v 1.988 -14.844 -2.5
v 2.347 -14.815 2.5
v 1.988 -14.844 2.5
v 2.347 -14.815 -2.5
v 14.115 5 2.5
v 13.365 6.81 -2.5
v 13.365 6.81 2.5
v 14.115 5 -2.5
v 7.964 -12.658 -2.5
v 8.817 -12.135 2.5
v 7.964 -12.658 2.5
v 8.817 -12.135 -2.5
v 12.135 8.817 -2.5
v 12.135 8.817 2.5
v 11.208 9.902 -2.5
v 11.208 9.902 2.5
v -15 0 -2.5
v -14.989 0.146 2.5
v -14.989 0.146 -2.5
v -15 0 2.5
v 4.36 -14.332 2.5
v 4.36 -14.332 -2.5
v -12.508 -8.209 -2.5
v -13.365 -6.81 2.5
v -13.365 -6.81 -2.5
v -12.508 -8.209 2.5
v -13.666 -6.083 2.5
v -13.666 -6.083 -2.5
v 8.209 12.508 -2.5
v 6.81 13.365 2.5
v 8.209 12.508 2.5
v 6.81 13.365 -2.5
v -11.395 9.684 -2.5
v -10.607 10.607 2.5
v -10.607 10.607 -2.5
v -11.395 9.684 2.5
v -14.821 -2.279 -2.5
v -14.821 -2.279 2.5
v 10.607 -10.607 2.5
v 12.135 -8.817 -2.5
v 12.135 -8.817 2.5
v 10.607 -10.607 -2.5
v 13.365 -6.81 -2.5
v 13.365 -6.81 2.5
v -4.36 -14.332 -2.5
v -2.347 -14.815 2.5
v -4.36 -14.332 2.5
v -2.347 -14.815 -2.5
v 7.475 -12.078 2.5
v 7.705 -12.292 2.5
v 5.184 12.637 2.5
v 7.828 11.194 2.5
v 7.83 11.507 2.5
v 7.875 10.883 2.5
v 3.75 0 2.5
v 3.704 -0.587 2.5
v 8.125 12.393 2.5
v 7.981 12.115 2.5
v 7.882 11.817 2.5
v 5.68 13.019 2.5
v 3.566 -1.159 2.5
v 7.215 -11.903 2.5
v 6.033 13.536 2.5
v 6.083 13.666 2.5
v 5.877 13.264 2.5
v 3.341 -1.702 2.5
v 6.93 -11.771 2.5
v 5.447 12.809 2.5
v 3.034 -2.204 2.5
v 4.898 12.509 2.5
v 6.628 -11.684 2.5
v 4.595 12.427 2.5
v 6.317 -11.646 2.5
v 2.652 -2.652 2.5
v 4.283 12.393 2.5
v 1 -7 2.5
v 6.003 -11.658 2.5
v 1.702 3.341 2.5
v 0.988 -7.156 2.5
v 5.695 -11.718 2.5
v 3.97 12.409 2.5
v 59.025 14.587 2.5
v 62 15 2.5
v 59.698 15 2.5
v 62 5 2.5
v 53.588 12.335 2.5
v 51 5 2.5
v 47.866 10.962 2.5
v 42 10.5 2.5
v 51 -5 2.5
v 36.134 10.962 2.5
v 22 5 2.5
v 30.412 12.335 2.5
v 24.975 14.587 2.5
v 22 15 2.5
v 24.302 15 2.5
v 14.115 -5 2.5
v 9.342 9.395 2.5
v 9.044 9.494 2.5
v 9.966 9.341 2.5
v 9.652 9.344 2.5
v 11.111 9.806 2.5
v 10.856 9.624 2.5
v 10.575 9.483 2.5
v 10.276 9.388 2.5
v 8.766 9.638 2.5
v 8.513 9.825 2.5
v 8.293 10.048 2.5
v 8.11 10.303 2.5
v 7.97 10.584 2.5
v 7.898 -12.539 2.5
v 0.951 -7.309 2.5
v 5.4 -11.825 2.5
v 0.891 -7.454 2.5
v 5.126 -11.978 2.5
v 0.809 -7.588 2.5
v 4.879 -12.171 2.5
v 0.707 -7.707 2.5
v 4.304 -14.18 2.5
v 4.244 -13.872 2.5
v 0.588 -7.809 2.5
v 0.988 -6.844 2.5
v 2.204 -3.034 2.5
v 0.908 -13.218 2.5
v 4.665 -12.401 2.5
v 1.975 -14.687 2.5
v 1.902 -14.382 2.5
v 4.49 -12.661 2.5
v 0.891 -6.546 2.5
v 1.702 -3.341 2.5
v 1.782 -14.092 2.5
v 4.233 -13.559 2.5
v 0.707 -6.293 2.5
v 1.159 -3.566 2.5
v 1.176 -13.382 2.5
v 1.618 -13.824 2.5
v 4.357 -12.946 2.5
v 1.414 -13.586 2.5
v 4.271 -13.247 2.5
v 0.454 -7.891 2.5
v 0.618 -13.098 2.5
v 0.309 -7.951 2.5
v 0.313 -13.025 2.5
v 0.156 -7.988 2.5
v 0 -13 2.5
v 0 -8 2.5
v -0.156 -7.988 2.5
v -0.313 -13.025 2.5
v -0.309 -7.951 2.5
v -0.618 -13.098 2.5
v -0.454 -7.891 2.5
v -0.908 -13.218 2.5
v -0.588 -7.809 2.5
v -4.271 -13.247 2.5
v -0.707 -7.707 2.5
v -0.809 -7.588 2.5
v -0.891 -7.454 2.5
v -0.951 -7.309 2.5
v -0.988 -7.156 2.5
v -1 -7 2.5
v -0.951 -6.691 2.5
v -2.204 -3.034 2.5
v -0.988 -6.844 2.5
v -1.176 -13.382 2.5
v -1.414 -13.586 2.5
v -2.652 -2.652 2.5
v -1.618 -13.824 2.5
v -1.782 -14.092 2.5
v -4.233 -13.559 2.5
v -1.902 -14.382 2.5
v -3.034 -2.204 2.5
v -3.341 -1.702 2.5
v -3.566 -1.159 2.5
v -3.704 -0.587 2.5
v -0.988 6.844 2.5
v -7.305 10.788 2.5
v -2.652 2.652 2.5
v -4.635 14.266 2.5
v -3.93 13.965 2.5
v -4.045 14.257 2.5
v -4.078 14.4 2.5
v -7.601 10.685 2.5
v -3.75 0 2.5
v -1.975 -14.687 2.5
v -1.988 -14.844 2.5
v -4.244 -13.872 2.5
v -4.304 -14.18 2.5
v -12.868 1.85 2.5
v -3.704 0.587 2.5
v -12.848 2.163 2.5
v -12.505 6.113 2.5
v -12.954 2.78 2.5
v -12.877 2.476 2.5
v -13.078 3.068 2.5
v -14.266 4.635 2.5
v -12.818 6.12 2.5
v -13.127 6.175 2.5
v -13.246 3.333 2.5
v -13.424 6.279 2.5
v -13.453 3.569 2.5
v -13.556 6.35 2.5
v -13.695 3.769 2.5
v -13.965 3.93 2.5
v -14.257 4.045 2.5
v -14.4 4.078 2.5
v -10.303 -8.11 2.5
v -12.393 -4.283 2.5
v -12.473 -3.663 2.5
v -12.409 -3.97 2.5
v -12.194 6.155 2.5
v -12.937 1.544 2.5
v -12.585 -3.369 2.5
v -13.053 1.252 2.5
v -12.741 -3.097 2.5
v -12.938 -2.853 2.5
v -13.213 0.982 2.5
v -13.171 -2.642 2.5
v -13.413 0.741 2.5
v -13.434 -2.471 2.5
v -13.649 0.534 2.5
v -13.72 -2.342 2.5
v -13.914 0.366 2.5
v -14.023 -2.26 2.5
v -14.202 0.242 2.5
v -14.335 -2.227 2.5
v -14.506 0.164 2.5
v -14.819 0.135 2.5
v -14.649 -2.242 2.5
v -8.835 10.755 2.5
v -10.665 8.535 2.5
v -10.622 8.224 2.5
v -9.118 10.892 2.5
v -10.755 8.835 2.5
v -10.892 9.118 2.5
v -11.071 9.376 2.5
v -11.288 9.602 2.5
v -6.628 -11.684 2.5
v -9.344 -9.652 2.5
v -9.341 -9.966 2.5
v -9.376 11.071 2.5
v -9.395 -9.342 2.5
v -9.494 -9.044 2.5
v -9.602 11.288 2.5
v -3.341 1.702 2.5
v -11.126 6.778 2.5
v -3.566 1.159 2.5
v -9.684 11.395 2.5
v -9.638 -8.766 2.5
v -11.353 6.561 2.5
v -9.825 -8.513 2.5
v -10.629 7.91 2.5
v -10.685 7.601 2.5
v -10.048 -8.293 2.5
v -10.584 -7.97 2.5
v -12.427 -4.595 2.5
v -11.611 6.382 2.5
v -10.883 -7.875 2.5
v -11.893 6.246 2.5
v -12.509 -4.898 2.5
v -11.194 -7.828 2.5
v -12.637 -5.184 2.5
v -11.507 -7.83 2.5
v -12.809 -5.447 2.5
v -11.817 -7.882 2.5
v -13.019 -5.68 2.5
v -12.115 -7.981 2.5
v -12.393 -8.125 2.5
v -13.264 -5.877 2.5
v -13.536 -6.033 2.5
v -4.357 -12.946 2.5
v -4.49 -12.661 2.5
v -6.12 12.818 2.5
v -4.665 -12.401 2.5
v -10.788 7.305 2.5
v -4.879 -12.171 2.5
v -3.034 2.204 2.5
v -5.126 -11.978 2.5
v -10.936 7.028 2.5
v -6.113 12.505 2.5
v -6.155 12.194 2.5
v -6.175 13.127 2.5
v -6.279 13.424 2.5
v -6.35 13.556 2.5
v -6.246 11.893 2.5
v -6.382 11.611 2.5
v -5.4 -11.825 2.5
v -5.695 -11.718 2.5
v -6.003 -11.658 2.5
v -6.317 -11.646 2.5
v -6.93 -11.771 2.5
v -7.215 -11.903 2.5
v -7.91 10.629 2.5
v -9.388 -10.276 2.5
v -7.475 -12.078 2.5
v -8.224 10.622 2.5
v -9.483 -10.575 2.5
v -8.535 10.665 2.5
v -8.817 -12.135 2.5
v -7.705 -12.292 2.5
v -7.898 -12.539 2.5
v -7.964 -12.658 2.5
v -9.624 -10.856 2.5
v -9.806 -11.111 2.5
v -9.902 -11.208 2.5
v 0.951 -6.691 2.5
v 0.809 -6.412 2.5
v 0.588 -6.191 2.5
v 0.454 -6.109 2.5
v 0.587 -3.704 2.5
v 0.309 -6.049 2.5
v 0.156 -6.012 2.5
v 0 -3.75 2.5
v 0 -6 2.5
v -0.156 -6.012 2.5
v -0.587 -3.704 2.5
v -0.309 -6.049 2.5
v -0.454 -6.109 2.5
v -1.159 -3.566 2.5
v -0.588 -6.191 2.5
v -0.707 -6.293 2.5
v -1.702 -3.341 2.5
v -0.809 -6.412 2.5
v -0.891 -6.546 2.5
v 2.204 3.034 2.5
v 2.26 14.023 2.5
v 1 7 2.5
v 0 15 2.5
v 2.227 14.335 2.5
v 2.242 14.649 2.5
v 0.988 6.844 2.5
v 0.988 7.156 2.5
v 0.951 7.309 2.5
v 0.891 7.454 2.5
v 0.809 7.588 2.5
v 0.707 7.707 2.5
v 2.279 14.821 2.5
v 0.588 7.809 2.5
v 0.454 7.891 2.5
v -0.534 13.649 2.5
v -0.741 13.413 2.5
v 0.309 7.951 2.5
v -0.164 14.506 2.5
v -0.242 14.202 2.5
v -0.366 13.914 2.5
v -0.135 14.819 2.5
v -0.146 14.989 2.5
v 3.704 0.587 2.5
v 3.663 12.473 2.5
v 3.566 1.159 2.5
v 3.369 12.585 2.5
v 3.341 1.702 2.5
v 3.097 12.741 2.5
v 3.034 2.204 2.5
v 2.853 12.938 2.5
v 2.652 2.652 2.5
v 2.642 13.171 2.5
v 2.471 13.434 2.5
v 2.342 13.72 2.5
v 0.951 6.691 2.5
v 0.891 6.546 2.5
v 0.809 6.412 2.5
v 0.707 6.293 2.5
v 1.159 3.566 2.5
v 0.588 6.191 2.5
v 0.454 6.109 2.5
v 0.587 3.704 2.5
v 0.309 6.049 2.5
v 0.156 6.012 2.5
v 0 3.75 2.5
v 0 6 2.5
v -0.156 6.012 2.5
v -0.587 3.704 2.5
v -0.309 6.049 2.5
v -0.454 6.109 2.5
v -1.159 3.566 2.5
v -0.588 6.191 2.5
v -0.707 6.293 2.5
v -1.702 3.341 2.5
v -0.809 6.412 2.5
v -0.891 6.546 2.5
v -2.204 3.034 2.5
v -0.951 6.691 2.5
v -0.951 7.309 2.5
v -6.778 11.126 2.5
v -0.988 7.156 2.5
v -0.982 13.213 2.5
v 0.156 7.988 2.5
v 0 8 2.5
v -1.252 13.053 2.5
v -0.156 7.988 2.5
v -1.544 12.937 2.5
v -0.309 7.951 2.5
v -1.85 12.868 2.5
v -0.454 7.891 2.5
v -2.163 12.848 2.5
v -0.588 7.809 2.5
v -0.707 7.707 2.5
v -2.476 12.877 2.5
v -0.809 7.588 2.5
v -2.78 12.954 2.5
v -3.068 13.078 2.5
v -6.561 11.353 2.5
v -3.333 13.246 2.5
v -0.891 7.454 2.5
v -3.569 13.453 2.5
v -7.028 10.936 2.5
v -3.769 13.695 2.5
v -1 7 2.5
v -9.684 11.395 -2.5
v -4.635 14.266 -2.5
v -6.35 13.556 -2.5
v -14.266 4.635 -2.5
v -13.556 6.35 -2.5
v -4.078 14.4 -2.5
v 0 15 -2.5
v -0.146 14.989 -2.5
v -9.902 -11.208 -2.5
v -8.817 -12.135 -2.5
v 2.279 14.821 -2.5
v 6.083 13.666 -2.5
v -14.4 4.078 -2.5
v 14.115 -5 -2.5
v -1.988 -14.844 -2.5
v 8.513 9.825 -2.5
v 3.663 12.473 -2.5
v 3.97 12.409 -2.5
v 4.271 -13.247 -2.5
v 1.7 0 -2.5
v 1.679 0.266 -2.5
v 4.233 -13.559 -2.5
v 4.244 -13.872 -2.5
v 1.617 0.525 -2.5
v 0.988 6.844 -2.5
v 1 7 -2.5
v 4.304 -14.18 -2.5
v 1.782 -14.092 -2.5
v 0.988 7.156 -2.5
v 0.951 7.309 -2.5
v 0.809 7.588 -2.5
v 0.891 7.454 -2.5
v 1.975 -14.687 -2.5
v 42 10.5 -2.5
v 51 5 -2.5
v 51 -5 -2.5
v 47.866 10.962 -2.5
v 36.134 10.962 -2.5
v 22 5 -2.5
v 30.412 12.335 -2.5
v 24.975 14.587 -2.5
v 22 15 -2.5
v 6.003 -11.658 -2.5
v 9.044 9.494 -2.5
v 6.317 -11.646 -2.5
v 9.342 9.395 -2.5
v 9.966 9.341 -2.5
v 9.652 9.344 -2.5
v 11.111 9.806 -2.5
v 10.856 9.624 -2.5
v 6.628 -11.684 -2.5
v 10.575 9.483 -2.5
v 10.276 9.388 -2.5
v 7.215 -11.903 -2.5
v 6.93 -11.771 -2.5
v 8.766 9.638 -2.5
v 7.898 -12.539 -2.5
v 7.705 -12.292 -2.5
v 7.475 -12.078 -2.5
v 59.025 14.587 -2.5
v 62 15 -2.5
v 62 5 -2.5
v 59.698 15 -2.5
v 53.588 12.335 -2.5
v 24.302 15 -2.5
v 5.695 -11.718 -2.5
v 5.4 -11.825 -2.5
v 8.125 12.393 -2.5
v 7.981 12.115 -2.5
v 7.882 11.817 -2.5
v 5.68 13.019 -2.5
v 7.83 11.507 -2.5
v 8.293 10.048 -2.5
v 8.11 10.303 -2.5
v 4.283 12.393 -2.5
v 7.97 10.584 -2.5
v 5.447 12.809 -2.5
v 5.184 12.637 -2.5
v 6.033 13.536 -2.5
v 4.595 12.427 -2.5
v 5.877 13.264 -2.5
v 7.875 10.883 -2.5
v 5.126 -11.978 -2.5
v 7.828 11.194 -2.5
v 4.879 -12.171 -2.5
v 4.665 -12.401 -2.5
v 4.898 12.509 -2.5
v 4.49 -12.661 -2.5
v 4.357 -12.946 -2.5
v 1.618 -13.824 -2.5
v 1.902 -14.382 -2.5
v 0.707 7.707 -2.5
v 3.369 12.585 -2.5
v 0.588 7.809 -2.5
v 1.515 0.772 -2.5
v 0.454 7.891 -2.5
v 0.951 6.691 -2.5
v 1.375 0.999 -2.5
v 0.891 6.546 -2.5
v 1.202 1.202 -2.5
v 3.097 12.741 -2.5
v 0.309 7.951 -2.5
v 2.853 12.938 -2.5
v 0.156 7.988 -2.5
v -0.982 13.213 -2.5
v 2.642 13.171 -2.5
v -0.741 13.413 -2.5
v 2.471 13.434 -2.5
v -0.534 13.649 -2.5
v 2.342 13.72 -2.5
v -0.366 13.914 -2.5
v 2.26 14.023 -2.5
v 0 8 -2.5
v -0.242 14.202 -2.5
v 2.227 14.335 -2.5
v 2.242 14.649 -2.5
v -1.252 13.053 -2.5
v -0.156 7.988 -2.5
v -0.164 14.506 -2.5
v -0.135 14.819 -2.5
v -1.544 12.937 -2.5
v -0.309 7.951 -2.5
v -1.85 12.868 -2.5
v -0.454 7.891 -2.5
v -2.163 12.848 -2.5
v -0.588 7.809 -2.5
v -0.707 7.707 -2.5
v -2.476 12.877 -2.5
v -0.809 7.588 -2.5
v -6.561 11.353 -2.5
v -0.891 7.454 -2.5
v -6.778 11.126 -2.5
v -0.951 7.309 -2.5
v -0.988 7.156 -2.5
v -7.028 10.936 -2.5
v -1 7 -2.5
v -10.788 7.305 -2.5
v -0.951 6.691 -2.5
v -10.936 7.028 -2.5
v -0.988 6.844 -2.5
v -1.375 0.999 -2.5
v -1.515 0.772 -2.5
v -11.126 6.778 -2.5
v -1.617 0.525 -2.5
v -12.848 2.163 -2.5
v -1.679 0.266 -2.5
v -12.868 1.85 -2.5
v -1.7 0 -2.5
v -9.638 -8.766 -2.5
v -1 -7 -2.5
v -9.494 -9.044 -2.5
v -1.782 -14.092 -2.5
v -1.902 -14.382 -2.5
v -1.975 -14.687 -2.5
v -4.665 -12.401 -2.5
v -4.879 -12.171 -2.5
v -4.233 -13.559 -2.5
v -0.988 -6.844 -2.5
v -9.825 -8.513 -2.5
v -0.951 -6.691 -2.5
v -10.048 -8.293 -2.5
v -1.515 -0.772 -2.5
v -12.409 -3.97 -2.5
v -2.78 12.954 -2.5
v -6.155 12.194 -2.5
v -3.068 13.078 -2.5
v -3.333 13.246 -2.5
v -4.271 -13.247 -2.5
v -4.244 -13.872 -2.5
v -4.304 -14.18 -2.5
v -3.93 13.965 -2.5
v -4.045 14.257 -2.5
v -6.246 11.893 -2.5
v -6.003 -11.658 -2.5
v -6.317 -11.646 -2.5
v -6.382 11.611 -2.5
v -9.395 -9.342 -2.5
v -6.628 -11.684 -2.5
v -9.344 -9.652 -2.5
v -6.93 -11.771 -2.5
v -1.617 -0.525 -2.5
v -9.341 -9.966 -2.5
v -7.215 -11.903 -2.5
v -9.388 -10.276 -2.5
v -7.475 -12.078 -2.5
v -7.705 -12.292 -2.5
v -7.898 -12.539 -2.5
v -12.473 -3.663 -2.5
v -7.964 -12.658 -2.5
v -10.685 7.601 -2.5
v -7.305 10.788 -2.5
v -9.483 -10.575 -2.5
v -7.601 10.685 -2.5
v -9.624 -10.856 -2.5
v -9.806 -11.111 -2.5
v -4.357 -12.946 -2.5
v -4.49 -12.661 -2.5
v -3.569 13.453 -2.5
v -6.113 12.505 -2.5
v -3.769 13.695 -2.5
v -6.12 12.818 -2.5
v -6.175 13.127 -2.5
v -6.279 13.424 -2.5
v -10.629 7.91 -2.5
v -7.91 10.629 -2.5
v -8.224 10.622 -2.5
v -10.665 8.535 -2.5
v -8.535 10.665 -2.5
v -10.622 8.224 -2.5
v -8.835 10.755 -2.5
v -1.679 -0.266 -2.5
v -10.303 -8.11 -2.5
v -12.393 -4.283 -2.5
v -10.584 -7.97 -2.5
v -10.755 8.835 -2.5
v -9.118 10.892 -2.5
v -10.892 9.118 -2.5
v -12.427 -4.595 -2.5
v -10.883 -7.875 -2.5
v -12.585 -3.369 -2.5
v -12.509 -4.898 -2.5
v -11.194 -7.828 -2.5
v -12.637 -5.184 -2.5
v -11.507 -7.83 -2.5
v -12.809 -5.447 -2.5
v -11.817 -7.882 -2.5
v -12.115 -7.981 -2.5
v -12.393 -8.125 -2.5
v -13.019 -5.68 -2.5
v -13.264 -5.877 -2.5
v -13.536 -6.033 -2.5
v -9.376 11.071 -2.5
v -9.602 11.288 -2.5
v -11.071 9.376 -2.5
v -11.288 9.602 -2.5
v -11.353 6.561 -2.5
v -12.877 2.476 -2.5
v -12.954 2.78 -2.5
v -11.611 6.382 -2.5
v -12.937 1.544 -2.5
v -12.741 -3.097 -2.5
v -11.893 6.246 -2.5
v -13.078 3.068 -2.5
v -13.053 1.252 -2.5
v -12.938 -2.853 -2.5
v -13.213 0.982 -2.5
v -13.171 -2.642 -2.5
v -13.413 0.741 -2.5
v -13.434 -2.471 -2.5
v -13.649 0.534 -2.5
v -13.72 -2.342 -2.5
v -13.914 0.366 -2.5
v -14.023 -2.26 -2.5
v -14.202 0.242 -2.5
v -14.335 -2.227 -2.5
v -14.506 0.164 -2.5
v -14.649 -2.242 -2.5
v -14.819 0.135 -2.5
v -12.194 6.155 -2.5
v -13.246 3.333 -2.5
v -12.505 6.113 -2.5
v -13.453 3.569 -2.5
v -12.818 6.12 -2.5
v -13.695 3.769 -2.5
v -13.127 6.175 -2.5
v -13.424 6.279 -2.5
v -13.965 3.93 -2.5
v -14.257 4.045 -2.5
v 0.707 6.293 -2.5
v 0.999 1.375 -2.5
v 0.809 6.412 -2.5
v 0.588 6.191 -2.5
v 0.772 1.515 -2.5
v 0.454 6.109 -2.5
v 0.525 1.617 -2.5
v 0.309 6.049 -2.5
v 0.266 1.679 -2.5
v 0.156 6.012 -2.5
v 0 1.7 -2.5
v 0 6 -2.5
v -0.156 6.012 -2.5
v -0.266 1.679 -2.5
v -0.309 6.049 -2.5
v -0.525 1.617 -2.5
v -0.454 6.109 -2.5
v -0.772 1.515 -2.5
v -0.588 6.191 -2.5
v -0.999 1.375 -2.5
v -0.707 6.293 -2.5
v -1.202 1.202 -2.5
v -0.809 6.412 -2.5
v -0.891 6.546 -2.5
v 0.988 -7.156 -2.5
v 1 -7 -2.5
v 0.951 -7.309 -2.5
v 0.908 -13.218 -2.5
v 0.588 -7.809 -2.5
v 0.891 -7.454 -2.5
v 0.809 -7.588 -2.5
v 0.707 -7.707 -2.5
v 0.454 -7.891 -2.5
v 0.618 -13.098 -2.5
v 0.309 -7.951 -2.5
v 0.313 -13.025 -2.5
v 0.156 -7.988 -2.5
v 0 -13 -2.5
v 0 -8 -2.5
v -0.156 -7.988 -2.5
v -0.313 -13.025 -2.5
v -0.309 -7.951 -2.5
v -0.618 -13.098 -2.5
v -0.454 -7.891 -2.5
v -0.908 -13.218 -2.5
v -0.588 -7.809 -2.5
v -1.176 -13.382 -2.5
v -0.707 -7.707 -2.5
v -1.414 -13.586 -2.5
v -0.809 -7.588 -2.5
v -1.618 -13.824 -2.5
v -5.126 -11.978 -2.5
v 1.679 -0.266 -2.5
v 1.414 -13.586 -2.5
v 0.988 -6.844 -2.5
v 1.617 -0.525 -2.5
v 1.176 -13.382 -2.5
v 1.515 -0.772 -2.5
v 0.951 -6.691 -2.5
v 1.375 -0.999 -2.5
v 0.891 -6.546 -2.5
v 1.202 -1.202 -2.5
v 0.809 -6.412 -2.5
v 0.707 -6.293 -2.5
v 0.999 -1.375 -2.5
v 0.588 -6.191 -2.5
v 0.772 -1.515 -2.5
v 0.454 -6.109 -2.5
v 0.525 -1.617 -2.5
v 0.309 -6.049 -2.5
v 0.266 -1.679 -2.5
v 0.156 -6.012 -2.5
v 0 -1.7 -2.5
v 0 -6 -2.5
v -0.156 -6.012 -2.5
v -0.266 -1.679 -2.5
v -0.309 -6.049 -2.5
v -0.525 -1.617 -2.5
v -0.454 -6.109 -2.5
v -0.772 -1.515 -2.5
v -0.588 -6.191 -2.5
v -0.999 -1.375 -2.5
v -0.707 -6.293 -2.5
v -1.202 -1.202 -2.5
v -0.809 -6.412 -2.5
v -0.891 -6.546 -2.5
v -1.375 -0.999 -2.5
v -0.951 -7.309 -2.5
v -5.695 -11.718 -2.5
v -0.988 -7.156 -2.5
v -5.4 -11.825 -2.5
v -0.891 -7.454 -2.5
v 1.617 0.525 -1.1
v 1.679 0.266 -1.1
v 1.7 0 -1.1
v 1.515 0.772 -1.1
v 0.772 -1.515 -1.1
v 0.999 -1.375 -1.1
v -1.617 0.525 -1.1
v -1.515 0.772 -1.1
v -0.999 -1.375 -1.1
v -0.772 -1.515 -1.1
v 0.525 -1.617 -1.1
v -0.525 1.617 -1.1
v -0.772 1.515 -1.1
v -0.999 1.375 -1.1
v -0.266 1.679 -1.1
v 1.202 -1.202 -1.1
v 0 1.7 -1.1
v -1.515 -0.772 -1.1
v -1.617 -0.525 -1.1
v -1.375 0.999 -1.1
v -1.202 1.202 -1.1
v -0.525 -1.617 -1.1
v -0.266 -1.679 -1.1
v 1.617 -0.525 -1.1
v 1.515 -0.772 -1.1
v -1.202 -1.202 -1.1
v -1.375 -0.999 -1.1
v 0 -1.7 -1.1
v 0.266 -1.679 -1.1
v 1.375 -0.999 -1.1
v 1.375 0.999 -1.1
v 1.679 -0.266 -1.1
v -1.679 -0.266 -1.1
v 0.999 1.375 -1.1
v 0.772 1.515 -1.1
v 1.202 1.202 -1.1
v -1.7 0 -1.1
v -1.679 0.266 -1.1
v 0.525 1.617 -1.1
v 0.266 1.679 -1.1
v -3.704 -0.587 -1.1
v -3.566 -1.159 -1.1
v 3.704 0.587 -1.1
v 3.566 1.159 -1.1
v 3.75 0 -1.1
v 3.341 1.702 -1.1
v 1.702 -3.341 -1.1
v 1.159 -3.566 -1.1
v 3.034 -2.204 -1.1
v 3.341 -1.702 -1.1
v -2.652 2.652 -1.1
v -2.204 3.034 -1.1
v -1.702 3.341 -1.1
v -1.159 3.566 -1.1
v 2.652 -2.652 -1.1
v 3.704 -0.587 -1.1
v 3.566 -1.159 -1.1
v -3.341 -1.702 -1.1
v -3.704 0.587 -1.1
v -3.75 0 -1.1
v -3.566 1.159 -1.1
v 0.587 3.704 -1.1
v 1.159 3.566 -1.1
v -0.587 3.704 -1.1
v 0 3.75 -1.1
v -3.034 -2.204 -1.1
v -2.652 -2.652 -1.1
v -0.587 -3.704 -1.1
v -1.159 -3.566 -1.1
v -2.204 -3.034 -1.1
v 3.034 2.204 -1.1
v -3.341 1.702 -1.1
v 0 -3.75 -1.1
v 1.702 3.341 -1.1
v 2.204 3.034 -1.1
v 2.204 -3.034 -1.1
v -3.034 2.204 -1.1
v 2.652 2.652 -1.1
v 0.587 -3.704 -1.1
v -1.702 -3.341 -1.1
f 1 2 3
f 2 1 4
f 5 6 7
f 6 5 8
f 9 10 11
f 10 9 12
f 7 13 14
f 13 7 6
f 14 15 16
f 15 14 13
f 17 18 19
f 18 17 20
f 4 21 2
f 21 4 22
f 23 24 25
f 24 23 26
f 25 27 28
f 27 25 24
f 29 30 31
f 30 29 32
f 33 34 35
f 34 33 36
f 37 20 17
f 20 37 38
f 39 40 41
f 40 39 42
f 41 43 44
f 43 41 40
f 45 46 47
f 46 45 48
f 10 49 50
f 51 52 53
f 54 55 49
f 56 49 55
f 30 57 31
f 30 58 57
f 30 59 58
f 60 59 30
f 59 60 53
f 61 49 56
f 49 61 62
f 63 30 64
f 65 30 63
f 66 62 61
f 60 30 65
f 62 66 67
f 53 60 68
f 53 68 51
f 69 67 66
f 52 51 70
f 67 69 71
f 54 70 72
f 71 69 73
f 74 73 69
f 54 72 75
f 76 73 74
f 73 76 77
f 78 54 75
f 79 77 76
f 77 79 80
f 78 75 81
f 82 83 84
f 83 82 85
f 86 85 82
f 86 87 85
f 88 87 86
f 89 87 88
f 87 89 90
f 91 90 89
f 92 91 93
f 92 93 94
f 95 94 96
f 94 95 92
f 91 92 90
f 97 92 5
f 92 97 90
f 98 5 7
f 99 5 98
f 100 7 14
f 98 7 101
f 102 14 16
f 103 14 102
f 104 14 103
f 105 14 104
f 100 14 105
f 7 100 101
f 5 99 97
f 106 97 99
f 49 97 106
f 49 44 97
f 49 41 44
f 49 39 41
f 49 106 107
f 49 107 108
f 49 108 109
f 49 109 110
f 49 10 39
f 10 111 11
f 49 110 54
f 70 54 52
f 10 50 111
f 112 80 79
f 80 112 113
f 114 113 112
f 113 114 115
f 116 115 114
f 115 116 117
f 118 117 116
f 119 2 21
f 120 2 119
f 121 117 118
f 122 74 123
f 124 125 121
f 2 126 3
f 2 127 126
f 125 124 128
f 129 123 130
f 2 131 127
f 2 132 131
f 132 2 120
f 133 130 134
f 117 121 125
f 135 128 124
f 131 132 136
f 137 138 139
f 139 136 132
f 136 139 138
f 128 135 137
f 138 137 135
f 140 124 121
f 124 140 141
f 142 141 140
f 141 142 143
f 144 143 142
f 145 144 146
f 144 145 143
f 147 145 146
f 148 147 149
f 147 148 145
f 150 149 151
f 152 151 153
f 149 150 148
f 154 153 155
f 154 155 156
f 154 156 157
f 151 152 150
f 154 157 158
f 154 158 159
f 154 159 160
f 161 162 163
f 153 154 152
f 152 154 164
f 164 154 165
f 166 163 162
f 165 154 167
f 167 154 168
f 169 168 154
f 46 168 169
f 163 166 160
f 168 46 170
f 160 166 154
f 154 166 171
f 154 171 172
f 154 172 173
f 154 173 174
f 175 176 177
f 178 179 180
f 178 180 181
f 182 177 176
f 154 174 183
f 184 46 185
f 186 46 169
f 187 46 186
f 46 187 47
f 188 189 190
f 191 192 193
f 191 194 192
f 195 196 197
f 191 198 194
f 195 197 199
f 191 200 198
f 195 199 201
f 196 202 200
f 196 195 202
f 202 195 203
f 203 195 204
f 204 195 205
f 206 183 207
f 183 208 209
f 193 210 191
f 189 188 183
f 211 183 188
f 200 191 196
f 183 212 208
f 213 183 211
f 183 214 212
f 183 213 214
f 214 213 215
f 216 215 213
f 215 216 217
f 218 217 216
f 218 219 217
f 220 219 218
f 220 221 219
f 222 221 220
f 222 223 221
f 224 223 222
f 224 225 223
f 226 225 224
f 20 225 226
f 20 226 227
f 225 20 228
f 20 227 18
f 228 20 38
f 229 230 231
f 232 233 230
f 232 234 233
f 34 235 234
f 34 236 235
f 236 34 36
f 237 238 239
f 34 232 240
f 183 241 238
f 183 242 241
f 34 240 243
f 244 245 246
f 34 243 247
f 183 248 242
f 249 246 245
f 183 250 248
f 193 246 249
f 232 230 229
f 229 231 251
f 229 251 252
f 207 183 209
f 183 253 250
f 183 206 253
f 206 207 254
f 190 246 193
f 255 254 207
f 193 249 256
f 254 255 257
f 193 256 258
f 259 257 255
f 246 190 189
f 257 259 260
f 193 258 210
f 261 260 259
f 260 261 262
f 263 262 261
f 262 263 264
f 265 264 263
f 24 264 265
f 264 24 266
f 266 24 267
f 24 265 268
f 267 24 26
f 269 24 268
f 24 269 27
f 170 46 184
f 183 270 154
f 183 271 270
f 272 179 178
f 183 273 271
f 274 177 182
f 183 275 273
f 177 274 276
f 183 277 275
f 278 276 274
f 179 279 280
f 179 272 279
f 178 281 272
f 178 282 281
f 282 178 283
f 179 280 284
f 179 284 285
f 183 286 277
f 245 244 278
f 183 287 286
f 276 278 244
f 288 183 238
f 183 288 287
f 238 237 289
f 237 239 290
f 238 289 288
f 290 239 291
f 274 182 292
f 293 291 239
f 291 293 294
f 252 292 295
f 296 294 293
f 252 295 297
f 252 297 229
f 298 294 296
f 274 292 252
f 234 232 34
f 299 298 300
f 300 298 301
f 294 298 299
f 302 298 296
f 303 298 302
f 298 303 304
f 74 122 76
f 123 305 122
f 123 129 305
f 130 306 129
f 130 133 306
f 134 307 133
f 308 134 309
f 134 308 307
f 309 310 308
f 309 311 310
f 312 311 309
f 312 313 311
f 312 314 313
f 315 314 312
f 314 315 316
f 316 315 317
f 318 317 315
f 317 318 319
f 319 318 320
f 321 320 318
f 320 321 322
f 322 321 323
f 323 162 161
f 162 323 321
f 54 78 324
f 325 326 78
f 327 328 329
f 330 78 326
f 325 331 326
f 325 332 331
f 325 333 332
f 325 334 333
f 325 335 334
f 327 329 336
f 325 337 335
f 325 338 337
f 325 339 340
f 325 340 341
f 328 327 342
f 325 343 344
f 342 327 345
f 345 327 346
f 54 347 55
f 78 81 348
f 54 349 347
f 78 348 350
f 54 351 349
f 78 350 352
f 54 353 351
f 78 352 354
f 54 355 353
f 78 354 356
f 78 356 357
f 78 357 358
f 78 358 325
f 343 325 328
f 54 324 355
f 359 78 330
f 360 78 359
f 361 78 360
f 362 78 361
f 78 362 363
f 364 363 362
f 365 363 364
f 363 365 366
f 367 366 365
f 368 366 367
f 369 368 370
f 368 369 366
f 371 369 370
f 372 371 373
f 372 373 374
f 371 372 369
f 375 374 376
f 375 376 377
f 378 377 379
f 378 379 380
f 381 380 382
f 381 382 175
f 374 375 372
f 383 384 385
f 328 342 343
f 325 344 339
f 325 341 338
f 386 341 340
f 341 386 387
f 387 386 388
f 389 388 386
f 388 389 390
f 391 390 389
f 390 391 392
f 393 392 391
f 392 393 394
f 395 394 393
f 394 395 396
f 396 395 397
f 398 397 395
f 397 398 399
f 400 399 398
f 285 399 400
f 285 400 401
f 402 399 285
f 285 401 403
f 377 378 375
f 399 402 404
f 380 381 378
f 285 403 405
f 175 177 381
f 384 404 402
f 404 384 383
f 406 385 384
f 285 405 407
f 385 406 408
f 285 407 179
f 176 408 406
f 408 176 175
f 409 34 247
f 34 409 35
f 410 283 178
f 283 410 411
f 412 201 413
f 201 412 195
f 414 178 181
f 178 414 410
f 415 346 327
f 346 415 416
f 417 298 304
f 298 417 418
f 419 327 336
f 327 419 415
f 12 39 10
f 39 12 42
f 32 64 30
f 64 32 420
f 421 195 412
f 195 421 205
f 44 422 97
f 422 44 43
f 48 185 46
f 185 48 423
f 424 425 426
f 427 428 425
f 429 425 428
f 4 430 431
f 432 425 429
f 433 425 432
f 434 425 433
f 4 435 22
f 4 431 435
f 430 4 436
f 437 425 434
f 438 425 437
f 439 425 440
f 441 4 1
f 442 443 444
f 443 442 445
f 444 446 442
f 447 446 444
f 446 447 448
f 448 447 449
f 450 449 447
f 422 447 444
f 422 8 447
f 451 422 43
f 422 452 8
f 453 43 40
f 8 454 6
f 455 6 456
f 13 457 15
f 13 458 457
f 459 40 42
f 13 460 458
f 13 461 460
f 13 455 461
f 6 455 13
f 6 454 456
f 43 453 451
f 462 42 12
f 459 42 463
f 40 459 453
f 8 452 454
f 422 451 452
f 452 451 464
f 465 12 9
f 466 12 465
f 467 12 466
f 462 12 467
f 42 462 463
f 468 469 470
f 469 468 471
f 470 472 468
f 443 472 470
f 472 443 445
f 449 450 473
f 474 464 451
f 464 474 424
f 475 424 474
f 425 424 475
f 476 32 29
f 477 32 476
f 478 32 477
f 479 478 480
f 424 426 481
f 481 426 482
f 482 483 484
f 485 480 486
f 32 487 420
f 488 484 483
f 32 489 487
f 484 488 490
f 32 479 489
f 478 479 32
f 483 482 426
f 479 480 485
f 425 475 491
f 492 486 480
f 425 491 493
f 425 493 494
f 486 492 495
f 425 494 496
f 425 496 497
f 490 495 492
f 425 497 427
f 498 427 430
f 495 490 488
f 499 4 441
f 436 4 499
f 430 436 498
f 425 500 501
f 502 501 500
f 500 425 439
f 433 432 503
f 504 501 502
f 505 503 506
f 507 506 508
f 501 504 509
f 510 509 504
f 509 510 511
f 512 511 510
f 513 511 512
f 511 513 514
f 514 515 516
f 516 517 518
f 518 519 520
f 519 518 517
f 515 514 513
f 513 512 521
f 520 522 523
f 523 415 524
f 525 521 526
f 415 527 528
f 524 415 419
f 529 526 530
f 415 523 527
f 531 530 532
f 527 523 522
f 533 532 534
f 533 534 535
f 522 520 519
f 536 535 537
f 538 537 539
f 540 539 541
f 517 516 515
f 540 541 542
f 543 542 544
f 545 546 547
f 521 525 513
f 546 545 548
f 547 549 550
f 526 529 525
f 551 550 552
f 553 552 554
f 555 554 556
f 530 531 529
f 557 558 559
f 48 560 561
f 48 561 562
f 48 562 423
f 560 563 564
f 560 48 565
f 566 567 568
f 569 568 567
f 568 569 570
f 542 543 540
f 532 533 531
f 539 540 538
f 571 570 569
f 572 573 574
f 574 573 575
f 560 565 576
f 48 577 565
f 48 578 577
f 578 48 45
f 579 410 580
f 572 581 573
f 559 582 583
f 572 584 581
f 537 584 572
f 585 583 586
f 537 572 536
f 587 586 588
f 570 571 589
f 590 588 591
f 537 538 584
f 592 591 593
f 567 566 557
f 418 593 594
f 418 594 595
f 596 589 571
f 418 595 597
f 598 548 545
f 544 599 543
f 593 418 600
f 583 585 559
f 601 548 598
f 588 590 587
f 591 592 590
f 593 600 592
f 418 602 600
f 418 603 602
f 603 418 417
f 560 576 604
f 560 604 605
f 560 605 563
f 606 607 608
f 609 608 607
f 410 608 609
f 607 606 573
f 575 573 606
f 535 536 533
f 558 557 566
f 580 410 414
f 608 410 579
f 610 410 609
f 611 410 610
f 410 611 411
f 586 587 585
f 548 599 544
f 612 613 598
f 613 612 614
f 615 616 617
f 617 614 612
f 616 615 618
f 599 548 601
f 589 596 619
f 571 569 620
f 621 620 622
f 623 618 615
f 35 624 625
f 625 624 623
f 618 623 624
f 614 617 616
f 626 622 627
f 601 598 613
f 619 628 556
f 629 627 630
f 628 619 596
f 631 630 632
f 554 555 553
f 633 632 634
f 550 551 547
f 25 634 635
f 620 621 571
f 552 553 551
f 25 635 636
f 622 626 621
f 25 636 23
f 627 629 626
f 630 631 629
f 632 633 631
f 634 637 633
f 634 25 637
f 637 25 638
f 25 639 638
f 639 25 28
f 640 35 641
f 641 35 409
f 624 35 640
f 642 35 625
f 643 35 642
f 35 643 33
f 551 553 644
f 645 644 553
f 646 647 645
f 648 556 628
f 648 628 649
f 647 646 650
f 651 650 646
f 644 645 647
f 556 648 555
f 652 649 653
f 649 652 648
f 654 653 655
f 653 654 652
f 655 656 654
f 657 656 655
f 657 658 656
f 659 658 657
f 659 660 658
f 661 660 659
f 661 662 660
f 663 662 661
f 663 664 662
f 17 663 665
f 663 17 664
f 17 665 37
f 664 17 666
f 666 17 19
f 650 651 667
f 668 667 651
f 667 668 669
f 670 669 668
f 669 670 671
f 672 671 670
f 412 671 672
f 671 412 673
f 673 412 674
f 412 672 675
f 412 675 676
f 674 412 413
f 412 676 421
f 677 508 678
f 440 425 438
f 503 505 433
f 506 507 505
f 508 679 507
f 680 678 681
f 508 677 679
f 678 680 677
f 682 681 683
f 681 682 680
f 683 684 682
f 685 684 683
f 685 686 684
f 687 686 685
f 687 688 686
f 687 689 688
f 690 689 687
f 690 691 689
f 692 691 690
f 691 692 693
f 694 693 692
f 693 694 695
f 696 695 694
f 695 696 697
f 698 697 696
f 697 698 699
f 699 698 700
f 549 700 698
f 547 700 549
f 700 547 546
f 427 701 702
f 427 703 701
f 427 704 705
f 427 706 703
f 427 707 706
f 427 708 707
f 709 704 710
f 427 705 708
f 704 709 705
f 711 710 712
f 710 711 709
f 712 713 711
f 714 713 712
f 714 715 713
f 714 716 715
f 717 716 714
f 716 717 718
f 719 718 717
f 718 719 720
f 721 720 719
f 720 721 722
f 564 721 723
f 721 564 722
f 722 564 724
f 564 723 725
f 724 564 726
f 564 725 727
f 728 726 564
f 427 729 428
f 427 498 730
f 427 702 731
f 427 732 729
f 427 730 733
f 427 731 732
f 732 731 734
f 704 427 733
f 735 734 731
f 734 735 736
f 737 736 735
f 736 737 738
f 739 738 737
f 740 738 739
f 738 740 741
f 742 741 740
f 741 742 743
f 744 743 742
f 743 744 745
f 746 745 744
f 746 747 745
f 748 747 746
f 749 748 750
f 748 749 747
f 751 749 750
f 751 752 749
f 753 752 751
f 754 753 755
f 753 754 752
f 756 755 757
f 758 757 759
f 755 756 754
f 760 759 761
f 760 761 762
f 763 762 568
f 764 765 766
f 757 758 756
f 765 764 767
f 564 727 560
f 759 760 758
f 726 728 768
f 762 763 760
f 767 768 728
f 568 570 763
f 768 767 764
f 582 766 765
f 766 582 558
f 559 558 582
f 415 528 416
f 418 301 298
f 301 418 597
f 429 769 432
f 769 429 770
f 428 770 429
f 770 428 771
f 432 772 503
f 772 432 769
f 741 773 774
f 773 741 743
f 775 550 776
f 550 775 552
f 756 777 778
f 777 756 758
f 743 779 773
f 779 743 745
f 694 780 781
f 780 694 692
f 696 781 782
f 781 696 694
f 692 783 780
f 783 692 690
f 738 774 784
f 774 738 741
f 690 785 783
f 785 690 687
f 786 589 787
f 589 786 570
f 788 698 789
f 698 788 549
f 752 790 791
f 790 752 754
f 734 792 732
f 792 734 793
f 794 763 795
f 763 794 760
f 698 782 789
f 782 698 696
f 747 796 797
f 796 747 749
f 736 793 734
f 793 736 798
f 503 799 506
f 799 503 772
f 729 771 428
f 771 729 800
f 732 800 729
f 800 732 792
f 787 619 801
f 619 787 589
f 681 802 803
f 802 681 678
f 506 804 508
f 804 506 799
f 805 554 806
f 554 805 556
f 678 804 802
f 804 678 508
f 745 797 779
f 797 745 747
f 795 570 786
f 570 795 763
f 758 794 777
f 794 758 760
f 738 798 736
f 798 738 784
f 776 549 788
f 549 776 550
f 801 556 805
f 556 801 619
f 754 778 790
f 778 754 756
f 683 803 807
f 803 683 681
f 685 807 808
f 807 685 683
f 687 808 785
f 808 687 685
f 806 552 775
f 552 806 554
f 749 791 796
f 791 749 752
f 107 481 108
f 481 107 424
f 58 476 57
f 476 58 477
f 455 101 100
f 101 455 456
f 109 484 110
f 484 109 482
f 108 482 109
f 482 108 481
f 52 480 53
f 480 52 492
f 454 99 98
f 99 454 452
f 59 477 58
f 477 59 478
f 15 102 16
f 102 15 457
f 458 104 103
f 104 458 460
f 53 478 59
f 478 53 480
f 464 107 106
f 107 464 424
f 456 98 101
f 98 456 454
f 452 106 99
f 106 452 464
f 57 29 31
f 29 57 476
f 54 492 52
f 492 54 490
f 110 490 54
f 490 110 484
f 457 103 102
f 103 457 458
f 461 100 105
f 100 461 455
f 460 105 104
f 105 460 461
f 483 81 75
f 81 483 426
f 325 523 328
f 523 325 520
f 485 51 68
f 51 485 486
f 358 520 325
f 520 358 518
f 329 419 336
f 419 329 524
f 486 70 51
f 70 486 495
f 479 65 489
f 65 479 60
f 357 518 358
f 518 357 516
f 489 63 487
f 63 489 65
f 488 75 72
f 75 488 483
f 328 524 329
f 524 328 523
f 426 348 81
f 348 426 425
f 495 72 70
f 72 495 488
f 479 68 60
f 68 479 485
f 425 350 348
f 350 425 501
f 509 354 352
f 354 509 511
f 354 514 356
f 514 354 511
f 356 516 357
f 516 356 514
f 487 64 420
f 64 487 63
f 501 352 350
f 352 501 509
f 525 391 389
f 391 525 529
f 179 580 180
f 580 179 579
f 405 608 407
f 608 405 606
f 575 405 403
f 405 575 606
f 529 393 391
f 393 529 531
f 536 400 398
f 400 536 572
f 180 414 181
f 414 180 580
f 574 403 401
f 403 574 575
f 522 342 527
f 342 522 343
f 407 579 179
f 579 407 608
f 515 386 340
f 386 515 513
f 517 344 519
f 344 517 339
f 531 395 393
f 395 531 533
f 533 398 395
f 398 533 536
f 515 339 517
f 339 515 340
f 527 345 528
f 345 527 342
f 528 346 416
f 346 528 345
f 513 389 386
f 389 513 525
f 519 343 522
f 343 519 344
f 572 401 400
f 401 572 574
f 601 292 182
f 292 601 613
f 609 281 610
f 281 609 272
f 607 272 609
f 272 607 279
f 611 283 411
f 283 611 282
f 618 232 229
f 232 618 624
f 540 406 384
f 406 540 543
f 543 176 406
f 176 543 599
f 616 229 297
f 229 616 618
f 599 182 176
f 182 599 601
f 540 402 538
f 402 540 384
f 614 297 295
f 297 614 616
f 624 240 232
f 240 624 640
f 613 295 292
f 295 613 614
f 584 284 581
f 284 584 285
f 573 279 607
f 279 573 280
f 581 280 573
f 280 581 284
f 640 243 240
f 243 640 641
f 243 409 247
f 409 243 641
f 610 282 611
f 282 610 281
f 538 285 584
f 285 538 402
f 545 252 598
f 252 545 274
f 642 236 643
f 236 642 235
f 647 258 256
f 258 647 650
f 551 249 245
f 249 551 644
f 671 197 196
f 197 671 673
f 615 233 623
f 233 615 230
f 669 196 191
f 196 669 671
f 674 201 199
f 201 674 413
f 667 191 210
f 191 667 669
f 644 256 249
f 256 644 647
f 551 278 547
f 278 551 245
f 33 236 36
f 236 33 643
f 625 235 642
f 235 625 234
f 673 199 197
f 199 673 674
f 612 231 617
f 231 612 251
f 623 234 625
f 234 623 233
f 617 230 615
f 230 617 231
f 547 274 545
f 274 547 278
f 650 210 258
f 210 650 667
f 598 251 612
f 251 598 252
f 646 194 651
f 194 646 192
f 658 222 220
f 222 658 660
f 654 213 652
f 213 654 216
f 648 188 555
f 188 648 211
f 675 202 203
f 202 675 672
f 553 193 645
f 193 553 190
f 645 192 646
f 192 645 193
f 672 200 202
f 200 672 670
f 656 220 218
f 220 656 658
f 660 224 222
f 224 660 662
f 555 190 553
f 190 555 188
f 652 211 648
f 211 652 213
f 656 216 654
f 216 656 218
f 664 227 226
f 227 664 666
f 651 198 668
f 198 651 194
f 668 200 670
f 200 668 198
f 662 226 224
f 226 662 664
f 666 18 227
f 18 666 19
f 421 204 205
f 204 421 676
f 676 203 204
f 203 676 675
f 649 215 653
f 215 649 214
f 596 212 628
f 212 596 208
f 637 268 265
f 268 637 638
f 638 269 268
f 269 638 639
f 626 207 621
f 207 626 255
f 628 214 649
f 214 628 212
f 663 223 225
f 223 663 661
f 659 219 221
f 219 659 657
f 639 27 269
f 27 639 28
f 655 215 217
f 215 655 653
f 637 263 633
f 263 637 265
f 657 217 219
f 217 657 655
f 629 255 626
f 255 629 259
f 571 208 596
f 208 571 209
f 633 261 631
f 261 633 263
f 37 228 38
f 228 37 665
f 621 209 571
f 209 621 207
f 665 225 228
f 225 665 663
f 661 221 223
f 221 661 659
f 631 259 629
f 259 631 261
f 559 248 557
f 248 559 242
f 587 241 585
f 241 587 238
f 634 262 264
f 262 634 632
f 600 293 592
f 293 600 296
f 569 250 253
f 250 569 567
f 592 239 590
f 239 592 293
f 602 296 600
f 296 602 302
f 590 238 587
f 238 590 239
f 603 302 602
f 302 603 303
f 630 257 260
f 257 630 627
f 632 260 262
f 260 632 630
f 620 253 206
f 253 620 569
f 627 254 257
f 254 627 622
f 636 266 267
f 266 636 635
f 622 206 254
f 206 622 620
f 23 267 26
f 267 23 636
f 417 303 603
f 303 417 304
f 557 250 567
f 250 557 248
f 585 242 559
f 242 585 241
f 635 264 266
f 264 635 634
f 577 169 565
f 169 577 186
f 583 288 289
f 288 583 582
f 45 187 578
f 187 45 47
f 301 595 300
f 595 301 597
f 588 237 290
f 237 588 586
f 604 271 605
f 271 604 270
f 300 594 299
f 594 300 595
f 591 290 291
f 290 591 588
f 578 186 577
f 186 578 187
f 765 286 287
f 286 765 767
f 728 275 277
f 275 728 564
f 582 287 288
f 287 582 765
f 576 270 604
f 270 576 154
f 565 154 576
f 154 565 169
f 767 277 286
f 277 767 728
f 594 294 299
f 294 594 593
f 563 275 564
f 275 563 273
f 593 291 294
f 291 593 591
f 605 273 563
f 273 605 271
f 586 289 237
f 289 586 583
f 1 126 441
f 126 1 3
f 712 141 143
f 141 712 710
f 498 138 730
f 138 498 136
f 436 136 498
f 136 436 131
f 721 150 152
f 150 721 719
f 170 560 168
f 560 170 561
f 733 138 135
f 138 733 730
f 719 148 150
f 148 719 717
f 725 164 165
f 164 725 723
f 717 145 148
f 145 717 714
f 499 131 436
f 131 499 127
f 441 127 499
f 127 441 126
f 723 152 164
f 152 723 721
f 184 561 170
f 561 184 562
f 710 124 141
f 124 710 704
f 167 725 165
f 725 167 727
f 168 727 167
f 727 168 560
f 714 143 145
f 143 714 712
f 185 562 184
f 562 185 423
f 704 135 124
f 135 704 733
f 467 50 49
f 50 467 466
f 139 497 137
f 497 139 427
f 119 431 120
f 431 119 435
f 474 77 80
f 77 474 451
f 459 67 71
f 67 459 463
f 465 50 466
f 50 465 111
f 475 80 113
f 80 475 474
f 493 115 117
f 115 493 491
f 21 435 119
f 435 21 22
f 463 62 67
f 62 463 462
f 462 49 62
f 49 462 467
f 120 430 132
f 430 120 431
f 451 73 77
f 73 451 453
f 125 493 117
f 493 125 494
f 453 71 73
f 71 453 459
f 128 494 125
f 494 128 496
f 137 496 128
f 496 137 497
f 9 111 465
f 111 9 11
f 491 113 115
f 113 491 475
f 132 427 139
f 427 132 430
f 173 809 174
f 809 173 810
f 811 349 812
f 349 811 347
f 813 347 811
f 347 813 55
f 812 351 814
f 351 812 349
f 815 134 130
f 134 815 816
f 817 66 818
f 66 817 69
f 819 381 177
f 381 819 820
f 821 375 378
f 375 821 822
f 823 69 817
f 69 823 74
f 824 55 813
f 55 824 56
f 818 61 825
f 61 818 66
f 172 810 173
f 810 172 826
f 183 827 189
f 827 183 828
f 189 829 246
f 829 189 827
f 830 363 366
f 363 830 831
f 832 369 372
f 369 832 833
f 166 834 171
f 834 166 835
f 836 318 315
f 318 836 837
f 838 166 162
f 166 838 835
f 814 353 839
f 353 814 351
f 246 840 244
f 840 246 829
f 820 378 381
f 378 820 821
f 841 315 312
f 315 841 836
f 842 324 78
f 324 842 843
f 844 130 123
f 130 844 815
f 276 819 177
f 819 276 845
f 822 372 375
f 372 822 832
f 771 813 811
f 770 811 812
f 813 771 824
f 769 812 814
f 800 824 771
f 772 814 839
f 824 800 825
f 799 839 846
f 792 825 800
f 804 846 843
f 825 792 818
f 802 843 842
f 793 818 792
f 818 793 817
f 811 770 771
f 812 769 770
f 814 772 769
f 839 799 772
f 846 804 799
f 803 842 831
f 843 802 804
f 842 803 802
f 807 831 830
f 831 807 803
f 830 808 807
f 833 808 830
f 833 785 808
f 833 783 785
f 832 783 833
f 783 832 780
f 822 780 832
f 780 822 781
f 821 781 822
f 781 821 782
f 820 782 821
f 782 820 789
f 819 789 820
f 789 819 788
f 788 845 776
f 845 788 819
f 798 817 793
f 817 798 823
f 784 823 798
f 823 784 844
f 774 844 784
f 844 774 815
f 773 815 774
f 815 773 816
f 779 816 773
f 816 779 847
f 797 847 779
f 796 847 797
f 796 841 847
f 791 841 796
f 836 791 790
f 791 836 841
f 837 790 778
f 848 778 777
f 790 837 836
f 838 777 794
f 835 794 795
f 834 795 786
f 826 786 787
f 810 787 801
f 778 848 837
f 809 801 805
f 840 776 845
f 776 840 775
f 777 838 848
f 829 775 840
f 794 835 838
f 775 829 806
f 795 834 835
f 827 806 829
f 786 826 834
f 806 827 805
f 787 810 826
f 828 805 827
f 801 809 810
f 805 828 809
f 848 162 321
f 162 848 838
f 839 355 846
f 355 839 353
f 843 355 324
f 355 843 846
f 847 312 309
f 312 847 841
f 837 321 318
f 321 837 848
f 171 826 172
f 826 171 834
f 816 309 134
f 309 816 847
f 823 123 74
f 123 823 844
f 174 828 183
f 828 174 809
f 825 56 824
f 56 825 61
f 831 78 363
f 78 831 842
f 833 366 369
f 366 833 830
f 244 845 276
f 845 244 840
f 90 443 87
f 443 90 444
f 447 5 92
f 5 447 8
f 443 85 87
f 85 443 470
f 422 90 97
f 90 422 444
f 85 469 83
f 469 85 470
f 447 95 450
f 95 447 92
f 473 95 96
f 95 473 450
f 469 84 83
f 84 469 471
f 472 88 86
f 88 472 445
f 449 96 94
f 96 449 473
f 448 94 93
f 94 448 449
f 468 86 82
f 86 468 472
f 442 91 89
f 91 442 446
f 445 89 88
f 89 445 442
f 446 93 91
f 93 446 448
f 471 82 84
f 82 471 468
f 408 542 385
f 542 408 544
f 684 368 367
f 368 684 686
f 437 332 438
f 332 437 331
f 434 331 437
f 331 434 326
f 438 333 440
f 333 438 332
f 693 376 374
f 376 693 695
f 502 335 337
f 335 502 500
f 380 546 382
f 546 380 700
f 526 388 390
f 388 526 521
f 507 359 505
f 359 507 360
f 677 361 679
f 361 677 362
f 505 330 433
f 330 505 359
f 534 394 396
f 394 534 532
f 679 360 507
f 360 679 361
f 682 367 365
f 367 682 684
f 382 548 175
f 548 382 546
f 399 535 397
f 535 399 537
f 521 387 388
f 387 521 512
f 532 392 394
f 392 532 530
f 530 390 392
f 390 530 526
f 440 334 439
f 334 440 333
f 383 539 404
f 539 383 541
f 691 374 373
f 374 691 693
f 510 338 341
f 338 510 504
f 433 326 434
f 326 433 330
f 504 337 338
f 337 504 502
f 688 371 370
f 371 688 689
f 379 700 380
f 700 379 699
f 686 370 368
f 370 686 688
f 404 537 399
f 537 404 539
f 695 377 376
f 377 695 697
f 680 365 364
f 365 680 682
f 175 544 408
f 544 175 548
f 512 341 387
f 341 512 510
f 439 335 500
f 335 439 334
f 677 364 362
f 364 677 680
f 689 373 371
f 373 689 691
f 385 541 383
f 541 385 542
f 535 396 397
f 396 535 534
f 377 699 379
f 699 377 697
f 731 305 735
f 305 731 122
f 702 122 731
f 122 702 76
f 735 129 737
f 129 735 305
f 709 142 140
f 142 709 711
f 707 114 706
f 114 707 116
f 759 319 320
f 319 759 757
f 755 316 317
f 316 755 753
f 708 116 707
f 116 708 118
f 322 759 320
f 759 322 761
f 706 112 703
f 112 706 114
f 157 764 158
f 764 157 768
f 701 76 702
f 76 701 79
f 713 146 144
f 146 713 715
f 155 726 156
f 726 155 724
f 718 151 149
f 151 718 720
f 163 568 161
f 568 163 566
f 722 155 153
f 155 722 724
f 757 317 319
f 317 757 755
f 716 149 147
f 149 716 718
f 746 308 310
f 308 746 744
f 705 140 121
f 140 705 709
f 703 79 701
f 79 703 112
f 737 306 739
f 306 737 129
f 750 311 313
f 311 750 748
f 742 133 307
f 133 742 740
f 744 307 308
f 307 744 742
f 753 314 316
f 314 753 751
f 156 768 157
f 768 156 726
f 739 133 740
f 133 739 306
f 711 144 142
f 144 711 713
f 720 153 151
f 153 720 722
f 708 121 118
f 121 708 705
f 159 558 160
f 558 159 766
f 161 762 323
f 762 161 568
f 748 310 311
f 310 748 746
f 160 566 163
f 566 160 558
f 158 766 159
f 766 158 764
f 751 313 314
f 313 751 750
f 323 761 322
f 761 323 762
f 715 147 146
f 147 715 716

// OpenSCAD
//Author: Piotr Paterek, Kraków 05-08.2016
$fn=40;
module claw()
{
difference()
{
    difference()
    {
        difference()
        {
            cylinder(r=15,h=5, center=true);
            cylinder(r=1.7,h=5, center=true);
        }
        
            for(i=[2:1:12])
            {
                rotate(a=i*270/11, v=[0,0,1])
                {
                    translate([15,0,0])
        {
                    
                        cylinder(r=2,h=5.2, center=true);
        }
                }
            }
    }
    translate([0,0,1.5])
    {
    cylinder(r=3.75,h=5.2, center=true);
}
}

translate([31,0,0])
{
    cube([40,10,5], center=true);
}
translate([42,10,0])
{
    cube([40,10,5], center=true);
}
}


difference()
{
    difference()
    {
        difference()
        {
            claw();
            translate([42,48,0])
            {
                cylinder(r=37.5, h=6, center=true);
            }
        }
    translate([0,7,0])
    {
        cylinder(r=1, h=6, center=true);
    }
    }
translate([0,-7,0])
{
    cylinder(r=1, h=6, center=true);
}
}
